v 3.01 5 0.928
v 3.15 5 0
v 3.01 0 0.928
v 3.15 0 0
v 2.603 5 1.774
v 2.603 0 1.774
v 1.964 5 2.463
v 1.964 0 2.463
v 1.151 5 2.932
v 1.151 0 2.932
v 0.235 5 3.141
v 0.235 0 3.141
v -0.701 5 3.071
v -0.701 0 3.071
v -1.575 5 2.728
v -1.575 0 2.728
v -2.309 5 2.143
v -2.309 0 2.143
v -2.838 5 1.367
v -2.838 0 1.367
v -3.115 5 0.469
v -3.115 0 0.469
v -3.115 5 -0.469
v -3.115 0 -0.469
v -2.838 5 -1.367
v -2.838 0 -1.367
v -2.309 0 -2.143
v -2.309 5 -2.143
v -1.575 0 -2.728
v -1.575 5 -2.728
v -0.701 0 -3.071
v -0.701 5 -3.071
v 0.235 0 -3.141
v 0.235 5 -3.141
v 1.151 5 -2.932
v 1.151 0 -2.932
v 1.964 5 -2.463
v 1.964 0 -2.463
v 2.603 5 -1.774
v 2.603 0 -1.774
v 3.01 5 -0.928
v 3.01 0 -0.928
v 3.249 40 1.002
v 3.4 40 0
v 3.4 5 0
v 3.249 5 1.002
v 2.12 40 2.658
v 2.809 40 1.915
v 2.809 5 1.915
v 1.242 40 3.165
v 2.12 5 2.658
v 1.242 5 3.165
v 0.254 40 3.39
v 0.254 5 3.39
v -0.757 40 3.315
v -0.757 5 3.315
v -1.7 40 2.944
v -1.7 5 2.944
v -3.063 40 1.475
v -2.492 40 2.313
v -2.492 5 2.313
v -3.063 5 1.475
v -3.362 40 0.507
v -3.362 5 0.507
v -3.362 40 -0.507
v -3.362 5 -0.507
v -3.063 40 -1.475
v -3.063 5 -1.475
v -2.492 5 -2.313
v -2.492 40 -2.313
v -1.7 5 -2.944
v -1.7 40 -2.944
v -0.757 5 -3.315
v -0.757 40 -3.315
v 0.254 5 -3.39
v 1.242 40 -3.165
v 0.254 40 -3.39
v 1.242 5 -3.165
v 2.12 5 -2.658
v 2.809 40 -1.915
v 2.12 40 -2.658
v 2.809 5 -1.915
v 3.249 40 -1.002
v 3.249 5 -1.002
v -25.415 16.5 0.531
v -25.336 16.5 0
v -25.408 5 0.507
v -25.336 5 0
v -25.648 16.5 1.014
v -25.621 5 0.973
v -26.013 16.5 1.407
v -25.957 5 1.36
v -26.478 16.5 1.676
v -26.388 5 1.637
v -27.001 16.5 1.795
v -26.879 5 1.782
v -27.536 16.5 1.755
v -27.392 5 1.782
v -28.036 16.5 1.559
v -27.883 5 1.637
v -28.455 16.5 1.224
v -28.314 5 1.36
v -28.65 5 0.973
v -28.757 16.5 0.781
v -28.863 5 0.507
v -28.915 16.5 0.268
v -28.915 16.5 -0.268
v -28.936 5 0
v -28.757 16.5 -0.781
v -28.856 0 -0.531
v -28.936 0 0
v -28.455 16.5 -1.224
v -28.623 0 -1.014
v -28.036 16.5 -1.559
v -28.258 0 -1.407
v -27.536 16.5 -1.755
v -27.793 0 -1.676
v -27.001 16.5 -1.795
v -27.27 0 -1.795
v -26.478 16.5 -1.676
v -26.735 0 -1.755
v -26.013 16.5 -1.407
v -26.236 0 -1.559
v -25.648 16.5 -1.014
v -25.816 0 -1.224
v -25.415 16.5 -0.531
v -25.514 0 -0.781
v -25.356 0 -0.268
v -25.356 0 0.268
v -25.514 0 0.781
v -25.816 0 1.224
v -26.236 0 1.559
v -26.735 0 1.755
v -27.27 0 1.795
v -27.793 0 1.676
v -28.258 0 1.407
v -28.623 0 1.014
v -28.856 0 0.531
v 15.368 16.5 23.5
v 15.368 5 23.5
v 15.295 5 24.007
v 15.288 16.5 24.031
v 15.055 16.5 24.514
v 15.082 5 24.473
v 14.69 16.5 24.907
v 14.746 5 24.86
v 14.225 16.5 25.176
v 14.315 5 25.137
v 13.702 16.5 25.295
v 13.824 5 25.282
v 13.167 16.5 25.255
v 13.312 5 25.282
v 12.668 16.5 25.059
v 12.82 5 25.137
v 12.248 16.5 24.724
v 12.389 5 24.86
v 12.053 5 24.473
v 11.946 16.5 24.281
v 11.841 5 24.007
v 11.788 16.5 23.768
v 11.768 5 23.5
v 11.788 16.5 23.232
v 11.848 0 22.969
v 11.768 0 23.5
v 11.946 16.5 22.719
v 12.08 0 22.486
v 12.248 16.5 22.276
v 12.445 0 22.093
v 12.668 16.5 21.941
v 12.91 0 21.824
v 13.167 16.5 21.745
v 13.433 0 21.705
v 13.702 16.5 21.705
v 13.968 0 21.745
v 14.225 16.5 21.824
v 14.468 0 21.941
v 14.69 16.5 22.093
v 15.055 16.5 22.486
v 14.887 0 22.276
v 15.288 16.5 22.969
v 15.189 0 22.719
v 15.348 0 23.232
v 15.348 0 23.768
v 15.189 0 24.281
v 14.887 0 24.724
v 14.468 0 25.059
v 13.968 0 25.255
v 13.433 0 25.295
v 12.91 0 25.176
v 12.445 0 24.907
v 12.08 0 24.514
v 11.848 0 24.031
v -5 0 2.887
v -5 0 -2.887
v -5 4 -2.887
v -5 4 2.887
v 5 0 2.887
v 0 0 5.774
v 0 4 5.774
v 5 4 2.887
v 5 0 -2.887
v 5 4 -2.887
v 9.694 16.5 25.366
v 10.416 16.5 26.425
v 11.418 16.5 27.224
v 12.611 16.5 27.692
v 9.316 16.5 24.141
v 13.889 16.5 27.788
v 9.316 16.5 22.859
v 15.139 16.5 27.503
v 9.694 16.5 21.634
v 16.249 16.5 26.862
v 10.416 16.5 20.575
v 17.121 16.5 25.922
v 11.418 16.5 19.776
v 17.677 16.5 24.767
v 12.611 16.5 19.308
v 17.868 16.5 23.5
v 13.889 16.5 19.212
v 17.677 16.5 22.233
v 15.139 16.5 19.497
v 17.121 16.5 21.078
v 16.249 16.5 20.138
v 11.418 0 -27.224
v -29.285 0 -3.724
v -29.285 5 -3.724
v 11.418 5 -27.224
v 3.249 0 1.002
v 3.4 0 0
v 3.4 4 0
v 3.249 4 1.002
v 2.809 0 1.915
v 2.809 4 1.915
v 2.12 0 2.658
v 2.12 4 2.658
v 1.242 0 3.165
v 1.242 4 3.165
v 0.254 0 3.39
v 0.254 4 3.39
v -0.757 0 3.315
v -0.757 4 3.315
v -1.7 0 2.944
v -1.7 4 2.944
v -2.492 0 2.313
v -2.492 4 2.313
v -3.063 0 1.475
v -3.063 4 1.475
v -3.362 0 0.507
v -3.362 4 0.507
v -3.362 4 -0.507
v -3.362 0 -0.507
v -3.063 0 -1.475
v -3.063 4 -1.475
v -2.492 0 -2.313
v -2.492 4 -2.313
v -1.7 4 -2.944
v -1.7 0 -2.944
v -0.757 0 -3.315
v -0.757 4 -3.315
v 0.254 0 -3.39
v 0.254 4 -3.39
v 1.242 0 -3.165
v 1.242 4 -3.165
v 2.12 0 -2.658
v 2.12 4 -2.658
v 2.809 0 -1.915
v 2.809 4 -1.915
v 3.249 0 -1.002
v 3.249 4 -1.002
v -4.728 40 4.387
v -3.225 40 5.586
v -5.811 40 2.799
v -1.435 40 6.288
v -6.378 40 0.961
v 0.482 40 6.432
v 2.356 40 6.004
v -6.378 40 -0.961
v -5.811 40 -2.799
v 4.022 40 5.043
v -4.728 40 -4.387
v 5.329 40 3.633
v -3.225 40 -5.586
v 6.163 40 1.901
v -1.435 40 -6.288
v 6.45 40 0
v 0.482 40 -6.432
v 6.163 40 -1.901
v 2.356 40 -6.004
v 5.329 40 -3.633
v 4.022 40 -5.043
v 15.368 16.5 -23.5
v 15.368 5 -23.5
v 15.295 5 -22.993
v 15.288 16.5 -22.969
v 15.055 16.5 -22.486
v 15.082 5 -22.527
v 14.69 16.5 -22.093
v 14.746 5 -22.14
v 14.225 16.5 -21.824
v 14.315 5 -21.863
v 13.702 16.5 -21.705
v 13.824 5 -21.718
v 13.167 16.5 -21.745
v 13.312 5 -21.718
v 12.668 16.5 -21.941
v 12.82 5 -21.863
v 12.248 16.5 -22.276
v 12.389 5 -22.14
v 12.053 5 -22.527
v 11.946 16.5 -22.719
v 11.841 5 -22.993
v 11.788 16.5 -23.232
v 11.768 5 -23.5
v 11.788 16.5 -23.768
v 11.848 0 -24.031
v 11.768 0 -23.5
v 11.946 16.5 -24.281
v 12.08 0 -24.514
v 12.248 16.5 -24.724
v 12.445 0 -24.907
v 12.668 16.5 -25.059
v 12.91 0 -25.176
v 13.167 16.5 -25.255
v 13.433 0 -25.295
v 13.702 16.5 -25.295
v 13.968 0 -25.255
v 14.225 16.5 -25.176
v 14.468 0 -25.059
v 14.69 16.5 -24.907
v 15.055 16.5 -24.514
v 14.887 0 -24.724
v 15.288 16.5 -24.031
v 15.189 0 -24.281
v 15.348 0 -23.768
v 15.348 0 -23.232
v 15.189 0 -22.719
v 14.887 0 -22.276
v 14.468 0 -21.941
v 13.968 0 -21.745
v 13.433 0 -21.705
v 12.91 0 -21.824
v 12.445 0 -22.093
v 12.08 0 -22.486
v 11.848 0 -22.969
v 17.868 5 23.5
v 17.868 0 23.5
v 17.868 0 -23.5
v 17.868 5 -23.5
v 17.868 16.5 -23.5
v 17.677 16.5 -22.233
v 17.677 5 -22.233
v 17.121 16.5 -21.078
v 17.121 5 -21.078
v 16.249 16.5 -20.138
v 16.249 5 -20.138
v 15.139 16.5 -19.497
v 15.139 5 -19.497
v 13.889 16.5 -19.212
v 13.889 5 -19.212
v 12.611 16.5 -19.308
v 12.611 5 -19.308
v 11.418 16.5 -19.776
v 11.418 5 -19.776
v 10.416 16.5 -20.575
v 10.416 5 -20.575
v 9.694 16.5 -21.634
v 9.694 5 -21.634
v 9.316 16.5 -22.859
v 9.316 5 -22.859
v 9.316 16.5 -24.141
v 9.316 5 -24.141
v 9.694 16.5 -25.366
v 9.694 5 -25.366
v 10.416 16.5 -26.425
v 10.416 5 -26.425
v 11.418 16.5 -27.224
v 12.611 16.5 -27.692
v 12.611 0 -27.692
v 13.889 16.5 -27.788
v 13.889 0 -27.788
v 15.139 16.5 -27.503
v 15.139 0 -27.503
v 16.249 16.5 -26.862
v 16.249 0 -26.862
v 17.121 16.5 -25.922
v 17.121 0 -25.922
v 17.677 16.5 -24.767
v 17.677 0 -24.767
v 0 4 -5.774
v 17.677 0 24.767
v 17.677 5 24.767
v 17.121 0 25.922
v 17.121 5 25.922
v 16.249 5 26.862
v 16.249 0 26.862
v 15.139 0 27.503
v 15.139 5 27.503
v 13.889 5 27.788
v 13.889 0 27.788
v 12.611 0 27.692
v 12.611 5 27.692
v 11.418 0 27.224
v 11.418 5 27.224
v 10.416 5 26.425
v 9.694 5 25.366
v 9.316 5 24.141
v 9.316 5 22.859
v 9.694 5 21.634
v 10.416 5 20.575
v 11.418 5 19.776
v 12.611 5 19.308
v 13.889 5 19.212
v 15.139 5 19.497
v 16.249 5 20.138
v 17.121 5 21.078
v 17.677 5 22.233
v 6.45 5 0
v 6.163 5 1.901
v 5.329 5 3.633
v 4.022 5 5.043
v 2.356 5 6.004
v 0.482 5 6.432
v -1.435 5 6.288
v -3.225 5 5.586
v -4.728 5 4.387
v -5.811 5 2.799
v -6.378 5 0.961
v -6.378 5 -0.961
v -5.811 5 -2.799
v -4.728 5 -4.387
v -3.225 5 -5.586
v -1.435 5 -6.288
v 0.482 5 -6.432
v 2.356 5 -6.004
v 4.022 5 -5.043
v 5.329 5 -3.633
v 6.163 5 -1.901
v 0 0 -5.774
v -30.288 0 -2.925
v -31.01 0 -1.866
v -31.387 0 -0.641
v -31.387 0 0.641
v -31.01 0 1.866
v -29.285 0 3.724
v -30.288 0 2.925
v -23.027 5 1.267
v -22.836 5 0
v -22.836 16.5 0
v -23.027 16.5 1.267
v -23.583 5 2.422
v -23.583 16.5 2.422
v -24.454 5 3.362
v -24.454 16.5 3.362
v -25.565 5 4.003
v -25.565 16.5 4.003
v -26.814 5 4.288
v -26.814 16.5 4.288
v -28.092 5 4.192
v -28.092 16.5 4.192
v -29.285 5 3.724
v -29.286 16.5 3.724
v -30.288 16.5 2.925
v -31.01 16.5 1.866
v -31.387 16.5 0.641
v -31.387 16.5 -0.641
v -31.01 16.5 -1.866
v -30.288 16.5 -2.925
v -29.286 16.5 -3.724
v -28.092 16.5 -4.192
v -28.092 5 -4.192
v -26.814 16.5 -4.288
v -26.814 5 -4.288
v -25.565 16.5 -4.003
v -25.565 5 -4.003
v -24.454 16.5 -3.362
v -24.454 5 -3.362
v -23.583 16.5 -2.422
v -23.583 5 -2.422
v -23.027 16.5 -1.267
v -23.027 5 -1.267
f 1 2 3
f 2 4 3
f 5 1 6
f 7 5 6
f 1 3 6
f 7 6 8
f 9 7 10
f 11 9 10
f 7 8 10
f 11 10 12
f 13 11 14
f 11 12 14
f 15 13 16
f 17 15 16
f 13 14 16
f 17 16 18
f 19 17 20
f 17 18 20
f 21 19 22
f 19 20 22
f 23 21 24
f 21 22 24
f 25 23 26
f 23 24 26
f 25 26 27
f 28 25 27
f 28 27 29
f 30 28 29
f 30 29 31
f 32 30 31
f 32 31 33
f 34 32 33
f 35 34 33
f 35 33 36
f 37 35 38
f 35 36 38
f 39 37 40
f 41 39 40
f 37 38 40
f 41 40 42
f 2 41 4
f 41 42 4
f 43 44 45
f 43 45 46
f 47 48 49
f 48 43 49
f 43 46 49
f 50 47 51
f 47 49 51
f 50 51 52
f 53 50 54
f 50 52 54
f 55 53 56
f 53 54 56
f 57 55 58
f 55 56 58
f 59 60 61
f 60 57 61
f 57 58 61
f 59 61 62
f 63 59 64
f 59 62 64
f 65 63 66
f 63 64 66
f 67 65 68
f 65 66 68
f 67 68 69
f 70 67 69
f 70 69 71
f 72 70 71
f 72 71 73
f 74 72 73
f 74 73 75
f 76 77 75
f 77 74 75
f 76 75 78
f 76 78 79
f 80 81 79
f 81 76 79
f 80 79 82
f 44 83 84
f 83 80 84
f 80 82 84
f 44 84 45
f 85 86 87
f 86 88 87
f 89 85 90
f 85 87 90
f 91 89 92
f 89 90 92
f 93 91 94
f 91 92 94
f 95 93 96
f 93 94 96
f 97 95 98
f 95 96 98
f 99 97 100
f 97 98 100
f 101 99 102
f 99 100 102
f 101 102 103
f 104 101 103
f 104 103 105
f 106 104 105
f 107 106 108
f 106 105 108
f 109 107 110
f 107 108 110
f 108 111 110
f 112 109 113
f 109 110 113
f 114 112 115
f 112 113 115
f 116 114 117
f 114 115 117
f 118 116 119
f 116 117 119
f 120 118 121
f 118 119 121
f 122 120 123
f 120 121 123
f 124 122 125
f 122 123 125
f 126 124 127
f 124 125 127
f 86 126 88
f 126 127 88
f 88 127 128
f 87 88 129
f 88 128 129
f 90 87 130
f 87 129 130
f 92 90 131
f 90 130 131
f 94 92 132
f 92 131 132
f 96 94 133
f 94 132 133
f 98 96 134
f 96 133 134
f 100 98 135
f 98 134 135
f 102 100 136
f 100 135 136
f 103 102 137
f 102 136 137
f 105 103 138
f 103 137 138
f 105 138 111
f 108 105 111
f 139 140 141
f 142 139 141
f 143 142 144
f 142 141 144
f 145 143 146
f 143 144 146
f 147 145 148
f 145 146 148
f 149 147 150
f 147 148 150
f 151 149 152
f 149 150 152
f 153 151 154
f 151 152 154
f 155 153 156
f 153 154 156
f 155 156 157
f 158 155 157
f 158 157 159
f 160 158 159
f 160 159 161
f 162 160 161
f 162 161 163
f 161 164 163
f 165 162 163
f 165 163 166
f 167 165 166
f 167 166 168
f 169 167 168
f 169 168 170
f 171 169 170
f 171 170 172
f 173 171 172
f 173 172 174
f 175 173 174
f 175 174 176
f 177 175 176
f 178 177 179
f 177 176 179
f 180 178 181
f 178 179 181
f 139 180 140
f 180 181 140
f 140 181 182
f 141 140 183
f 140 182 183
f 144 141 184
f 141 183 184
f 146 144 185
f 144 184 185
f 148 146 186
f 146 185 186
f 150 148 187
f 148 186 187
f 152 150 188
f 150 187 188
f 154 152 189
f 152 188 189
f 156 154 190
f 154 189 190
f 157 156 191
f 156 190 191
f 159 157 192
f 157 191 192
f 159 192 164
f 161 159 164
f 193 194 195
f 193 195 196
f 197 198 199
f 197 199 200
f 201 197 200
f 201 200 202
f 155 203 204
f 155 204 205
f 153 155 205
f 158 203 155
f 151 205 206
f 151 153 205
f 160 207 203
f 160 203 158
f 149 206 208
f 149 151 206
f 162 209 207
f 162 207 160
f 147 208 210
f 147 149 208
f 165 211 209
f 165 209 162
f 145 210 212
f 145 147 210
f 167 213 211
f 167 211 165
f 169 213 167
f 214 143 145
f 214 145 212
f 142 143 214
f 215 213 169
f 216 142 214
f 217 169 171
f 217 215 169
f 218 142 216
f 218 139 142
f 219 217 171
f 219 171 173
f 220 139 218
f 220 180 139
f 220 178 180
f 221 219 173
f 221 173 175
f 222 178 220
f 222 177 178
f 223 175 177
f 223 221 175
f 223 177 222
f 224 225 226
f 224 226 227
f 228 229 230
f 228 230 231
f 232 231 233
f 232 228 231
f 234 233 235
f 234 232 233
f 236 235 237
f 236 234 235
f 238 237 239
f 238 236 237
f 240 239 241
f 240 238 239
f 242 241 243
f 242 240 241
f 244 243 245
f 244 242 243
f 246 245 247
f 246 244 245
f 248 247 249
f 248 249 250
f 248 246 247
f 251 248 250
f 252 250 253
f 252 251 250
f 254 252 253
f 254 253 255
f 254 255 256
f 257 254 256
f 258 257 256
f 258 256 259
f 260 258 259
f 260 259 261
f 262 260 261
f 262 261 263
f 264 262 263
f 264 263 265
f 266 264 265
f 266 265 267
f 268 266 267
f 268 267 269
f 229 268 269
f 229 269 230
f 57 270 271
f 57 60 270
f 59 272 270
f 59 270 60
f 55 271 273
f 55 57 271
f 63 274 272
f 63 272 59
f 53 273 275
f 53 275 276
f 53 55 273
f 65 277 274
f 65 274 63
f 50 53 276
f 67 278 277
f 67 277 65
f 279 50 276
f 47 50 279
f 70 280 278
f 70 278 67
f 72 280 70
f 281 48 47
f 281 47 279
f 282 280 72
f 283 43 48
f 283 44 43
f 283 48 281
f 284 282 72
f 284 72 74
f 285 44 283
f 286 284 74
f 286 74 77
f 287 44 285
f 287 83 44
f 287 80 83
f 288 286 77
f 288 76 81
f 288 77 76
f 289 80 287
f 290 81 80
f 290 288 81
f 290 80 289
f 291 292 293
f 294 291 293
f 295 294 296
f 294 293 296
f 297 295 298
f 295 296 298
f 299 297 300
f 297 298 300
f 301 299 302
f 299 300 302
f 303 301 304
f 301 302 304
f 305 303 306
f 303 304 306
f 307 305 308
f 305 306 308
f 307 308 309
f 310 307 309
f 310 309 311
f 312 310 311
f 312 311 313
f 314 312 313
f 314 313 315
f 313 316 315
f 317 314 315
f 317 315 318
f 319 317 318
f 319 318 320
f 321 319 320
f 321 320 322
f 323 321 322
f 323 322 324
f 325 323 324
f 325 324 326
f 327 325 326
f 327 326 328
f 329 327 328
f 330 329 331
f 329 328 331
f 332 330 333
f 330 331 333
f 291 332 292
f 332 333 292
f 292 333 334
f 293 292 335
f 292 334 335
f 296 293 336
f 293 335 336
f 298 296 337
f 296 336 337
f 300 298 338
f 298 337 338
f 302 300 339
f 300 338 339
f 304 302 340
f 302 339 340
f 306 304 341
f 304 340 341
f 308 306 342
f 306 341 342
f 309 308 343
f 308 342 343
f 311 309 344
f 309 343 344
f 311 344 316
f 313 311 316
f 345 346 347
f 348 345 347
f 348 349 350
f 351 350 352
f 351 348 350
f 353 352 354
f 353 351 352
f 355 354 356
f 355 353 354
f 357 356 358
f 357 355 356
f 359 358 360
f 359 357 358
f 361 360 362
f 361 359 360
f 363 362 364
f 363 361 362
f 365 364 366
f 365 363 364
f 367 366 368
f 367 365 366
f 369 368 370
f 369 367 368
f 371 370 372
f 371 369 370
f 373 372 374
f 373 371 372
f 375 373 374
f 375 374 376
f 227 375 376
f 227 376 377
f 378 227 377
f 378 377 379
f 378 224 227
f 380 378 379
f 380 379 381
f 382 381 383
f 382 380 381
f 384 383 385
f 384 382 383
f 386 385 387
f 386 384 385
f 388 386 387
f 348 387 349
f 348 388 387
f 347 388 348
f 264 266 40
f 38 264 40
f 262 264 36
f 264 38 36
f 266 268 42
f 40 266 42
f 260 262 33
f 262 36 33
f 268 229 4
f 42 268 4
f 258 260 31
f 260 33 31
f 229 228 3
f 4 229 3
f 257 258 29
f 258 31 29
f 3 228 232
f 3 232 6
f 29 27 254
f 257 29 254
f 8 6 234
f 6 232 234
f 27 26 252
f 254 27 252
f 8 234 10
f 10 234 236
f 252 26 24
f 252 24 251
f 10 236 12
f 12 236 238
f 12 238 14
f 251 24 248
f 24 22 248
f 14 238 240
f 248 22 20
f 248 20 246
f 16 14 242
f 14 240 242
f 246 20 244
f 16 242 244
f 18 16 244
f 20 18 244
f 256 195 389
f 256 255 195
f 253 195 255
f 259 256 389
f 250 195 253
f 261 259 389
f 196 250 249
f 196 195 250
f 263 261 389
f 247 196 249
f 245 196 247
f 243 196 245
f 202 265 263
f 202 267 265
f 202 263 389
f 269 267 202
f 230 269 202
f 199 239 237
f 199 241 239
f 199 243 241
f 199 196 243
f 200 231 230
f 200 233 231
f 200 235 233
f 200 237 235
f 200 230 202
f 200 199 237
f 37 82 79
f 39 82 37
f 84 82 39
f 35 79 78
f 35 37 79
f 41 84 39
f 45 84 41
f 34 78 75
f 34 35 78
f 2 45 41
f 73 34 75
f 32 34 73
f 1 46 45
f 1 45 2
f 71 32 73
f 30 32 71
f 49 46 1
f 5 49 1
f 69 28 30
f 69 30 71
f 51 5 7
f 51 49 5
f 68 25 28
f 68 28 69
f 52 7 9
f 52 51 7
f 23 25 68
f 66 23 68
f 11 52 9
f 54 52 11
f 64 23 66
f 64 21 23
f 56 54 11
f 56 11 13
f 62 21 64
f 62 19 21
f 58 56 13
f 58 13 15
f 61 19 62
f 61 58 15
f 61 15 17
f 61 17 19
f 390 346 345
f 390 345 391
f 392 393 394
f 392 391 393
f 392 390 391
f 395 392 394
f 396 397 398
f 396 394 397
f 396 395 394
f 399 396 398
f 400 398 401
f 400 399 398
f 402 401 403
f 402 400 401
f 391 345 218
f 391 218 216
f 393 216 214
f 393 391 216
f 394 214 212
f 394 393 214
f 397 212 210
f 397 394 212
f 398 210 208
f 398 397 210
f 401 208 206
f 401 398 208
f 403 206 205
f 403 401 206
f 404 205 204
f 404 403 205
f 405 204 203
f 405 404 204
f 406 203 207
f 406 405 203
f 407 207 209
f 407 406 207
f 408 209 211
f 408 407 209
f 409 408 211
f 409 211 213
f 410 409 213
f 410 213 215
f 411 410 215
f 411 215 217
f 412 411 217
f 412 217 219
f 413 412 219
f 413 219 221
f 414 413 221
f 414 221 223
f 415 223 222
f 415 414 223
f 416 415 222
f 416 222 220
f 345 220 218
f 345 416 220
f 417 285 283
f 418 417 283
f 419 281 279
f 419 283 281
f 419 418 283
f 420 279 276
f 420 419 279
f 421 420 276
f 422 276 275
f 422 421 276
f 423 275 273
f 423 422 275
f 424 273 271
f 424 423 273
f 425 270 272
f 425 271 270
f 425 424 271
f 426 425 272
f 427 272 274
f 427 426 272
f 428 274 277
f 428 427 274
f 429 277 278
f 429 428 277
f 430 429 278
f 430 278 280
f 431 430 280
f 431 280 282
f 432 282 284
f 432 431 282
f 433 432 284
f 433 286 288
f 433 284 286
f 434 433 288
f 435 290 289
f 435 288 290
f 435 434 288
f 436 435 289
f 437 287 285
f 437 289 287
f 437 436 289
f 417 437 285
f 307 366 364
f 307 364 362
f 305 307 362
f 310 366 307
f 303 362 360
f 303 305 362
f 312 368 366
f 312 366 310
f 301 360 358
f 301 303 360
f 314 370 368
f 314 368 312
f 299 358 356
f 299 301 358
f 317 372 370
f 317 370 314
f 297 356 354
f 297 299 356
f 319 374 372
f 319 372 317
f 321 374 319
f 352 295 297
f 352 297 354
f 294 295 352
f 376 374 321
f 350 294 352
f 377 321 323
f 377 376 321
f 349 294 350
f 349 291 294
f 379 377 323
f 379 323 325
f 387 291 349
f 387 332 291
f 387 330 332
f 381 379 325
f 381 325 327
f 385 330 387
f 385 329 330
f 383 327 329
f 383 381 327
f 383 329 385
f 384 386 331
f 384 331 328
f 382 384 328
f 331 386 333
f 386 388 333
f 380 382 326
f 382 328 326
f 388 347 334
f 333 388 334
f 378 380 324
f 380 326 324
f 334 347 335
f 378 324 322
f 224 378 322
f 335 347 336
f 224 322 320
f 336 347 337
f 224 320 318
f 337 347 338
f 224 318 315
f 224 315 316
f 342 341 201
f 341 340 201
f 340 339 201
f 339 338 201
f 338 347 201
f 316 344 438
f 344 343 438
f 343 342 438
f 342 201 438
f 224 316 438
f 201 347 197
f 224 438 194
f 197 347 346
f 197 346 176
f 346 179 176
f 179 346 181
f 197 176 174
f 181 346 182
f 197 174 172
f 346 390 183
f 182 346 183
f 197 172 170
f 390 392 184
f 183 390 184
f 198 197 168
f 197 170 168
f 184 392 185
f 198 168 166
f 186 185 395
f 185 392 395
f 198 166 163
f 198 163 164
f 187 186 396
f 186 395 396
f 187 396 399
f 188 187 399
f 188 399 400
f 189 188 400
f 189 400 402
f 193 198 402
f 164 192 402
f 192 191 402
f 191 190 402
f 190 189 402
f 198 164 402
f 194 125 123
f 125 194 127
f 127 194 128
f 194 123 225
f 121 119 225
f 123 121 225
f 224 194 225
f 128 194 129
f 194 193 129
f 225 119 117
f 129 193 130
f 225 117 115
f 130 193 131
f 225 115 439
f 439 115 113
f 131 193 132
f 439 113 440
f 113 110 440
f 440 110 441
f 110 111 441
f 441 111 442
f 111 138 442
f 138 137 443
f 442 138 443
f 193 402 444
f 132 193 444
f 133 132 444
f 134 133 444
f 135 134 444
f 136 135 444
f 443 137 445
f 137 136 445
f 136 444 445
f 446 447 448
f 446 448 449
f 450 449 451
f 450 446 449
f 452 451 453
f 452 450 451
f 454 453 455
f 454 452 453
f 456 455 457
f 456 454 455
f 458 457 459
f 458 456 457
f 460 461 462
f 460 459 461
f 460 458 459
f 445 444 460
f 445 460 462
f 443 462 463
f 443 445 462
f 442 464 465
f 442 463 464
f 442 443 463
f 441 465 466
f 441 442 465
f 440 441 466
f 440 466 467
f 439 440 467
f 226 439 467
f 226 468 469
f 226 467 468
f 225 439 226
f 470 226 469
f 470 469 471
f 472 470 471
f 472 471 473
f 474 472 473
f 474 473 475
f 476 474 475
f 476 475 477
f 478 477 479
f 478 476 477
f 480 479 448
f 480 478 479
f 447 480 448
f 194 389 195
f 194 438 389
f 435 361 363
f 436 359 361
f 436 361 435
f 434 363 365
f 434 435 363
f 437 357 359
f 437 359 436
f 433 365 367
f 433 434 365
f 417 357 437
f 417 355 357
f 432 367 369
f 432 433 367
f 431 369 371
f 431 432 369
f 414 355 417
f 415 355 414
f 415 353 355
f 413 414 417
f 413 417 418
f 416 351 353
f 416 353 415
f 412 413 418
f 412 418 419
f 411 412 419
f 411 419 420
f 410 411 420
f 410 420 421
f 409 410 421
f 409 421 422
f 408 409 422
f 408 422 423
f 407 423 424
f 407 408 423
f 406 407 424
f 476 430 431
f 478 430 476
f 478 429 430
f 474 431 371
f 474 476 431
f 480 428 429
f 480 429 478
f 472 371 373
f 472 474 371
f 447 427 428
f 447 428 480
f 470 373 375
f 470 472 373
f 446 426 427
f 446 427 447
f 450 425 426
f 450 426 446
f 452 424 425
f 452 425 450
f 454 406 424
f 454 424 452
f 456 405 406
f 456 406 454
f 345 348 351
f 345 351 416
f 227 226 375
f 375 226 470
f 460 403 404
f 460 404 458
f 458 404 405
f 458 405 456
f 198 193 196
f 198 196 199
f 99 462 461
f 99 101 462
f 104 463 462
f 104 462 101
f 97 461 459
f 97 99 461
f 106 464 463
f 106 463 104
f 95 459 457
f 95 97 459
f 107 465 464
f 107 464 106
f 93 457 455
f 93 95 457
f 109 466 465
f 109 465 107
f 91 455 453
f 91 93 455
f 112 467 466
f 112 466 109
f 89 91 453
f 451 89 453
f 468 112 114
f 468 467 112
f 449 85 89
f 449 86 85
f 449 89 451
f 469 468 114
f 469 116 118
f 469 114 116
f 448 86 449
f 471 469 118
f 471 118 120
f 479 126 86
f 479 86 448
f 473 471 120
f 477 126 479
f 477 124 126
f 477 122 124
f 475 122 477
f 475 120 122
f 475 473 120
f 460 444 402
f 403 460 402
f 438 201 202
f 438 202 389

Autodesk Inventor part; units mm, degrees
ref_plane "YZ Plane" through (0, 0, 0) normal (1, 0, 0) x (0, 1, 0)
ref_plane "XZ Plane" through (0, 0, 0) normal (0, 1, 0) x (-1, 0, 0)
ref_plane "XY Plane" through (0, 0, 0) normal (0, 0, 1) x (1, 0, 0)
sketch "Sketch1" plane through (0, 0, 0) normal (0, 1, 0) x (-1, 0, 0)
  line L0 (27.1355, 0) -> (-13.5677, -23.5)
  line L1 (-13.5677, -23.5) -> (-13.5677, 23.5)
  line L2 (-13.5677, 23.5) -> (27.1355, 0)
  circle A0 centre (27.1355, 0) radius 1.8
  circle A1 centre (-13.5677, -23.5) radius 1.8
  circle A2 centre (-13.5677, 23.5) radius 1.8
  circle A3 centre (-13.5677, 23.5) radius 4.3
  circle A4 centre (-13.5677, -23.5) radius 4.3
  circle A5 centre (27.1355, 0) radius 4.3
  line L3 (37.2914, 0.8983) -> (-23.0689, -33.9507)
  line L4 (-17.8677, 35.8999) -> (-17.8677, -40.3839)
  line L5 (38.4842, -1.587) -> (-21.5839, 33.0933)
  point P0 (0, 0)
  point P1 (0, 0)
  point P2 (-11.4177, -27.2239)
  point P3 (29.2855, -3.7239)
  point P4 (29.2855, 3.7239)
  point P5 (-11.4177, 27.2239)
  point P6 (-17.8677, 23.5)
  point P7 (-17.8677, -23.5)
  dimension "d0" = 47
  dimension "d1" = 3.6
  dimension "d2" = 3.6
  dimension "d3" = 3.6
  dimension "d4" = 8.6
  dimension "d5" = 8.6
  dimension "d6" = 8.6
extrude "Extrusion1" add sketch "Sketch1" along normal blind 5 contours A0 L2 A5 L0 | L0 A5 L2 A0 | A5 L3 A4 L0 | L0 A4 L1 A3 L2 A5 | L2 A3 L5 A5 | A4 L1 A1 L0 | L0 A1 L1 A4 | A3 L1 A2 L2 | L2 A2 L1 A3 | A4 L4 A3 L1
sketch "Sketch2" plane through (0, 5, 0) normal (0, 1, 0) x (1, 0, 0)
  circle A0 centre (-27.1355, 0) radius 1.8 projected
  circle A1 centre (-27.1355, 0) radius 4.3
  circle A2 centre (13.5677, 23.5) radius 4.3
  circle A3 centre (13.5677, 23.5) radius 1.8 projected
  circle A4 centre (13.5677, -23.5) radius 1.8 projected
  line L0 (17.8677, -23.5) -> (17.8677, 23.5) projected
  circle A5 centre (13.5677, -23.5) radius 4.3
  point P0 (0, 0)
  dimension "d9" = 8.6
  dimension "d21" = 8.6
  dimension "d22" = 8.6
extrude "Extrusion2" add sketch "Sketch2" along normal blind 11.5
sketch "Sketch3" plane through (0, 5, 0) normal (0, 1, 0) x (1, 0, 0)
  circle A0 centre (0, 0) radius 3.4
  circle A1 centre (0, 0) radius 6.45
  dimension "d12" = 6.8
  dimension "d13" = 12.9
extrude "Extrusion3" add sketch "Sketch3" along normal blind 35
sketch "Sketch4" plane through (0, 0, 0) normal (0, -1, 0) x (1, 0, 0)
  circle A0 centre (0, 0) radius 3.15
  dimension "d23" = 6.3
extrude "Extrusion4" cut sketch "Sketch4" against normal blind 36
sketch "Sketch5" plane through (0, 0, 0) normal (0, -1, 0) x (1, 0, 0)
  circle A0 centre (0, 0) radius 3.4 projected
  line L0 (-5, 2.8868) -> (0, 5.7735)
  line L1 (0, 5.7735) -> (5, 2.8868)
  line L2 (5, 2.8868) -> (5, -2.8868)
  line L3 (5, -2.8868) -> (0, -5.7735)
  line L4 (0, -5.7735) -> (-5, -2.8868)
  line L5 (-5, -2.8868) -> (-5, 2.8868)
  dimension "d18" = 10
extrude "Extrusion5" cut sketch "Sketch5" against normal blind 4
equation "\"d21\" = d9"
equation "\"d22\" = d9"
properties part number "wheel_block"
